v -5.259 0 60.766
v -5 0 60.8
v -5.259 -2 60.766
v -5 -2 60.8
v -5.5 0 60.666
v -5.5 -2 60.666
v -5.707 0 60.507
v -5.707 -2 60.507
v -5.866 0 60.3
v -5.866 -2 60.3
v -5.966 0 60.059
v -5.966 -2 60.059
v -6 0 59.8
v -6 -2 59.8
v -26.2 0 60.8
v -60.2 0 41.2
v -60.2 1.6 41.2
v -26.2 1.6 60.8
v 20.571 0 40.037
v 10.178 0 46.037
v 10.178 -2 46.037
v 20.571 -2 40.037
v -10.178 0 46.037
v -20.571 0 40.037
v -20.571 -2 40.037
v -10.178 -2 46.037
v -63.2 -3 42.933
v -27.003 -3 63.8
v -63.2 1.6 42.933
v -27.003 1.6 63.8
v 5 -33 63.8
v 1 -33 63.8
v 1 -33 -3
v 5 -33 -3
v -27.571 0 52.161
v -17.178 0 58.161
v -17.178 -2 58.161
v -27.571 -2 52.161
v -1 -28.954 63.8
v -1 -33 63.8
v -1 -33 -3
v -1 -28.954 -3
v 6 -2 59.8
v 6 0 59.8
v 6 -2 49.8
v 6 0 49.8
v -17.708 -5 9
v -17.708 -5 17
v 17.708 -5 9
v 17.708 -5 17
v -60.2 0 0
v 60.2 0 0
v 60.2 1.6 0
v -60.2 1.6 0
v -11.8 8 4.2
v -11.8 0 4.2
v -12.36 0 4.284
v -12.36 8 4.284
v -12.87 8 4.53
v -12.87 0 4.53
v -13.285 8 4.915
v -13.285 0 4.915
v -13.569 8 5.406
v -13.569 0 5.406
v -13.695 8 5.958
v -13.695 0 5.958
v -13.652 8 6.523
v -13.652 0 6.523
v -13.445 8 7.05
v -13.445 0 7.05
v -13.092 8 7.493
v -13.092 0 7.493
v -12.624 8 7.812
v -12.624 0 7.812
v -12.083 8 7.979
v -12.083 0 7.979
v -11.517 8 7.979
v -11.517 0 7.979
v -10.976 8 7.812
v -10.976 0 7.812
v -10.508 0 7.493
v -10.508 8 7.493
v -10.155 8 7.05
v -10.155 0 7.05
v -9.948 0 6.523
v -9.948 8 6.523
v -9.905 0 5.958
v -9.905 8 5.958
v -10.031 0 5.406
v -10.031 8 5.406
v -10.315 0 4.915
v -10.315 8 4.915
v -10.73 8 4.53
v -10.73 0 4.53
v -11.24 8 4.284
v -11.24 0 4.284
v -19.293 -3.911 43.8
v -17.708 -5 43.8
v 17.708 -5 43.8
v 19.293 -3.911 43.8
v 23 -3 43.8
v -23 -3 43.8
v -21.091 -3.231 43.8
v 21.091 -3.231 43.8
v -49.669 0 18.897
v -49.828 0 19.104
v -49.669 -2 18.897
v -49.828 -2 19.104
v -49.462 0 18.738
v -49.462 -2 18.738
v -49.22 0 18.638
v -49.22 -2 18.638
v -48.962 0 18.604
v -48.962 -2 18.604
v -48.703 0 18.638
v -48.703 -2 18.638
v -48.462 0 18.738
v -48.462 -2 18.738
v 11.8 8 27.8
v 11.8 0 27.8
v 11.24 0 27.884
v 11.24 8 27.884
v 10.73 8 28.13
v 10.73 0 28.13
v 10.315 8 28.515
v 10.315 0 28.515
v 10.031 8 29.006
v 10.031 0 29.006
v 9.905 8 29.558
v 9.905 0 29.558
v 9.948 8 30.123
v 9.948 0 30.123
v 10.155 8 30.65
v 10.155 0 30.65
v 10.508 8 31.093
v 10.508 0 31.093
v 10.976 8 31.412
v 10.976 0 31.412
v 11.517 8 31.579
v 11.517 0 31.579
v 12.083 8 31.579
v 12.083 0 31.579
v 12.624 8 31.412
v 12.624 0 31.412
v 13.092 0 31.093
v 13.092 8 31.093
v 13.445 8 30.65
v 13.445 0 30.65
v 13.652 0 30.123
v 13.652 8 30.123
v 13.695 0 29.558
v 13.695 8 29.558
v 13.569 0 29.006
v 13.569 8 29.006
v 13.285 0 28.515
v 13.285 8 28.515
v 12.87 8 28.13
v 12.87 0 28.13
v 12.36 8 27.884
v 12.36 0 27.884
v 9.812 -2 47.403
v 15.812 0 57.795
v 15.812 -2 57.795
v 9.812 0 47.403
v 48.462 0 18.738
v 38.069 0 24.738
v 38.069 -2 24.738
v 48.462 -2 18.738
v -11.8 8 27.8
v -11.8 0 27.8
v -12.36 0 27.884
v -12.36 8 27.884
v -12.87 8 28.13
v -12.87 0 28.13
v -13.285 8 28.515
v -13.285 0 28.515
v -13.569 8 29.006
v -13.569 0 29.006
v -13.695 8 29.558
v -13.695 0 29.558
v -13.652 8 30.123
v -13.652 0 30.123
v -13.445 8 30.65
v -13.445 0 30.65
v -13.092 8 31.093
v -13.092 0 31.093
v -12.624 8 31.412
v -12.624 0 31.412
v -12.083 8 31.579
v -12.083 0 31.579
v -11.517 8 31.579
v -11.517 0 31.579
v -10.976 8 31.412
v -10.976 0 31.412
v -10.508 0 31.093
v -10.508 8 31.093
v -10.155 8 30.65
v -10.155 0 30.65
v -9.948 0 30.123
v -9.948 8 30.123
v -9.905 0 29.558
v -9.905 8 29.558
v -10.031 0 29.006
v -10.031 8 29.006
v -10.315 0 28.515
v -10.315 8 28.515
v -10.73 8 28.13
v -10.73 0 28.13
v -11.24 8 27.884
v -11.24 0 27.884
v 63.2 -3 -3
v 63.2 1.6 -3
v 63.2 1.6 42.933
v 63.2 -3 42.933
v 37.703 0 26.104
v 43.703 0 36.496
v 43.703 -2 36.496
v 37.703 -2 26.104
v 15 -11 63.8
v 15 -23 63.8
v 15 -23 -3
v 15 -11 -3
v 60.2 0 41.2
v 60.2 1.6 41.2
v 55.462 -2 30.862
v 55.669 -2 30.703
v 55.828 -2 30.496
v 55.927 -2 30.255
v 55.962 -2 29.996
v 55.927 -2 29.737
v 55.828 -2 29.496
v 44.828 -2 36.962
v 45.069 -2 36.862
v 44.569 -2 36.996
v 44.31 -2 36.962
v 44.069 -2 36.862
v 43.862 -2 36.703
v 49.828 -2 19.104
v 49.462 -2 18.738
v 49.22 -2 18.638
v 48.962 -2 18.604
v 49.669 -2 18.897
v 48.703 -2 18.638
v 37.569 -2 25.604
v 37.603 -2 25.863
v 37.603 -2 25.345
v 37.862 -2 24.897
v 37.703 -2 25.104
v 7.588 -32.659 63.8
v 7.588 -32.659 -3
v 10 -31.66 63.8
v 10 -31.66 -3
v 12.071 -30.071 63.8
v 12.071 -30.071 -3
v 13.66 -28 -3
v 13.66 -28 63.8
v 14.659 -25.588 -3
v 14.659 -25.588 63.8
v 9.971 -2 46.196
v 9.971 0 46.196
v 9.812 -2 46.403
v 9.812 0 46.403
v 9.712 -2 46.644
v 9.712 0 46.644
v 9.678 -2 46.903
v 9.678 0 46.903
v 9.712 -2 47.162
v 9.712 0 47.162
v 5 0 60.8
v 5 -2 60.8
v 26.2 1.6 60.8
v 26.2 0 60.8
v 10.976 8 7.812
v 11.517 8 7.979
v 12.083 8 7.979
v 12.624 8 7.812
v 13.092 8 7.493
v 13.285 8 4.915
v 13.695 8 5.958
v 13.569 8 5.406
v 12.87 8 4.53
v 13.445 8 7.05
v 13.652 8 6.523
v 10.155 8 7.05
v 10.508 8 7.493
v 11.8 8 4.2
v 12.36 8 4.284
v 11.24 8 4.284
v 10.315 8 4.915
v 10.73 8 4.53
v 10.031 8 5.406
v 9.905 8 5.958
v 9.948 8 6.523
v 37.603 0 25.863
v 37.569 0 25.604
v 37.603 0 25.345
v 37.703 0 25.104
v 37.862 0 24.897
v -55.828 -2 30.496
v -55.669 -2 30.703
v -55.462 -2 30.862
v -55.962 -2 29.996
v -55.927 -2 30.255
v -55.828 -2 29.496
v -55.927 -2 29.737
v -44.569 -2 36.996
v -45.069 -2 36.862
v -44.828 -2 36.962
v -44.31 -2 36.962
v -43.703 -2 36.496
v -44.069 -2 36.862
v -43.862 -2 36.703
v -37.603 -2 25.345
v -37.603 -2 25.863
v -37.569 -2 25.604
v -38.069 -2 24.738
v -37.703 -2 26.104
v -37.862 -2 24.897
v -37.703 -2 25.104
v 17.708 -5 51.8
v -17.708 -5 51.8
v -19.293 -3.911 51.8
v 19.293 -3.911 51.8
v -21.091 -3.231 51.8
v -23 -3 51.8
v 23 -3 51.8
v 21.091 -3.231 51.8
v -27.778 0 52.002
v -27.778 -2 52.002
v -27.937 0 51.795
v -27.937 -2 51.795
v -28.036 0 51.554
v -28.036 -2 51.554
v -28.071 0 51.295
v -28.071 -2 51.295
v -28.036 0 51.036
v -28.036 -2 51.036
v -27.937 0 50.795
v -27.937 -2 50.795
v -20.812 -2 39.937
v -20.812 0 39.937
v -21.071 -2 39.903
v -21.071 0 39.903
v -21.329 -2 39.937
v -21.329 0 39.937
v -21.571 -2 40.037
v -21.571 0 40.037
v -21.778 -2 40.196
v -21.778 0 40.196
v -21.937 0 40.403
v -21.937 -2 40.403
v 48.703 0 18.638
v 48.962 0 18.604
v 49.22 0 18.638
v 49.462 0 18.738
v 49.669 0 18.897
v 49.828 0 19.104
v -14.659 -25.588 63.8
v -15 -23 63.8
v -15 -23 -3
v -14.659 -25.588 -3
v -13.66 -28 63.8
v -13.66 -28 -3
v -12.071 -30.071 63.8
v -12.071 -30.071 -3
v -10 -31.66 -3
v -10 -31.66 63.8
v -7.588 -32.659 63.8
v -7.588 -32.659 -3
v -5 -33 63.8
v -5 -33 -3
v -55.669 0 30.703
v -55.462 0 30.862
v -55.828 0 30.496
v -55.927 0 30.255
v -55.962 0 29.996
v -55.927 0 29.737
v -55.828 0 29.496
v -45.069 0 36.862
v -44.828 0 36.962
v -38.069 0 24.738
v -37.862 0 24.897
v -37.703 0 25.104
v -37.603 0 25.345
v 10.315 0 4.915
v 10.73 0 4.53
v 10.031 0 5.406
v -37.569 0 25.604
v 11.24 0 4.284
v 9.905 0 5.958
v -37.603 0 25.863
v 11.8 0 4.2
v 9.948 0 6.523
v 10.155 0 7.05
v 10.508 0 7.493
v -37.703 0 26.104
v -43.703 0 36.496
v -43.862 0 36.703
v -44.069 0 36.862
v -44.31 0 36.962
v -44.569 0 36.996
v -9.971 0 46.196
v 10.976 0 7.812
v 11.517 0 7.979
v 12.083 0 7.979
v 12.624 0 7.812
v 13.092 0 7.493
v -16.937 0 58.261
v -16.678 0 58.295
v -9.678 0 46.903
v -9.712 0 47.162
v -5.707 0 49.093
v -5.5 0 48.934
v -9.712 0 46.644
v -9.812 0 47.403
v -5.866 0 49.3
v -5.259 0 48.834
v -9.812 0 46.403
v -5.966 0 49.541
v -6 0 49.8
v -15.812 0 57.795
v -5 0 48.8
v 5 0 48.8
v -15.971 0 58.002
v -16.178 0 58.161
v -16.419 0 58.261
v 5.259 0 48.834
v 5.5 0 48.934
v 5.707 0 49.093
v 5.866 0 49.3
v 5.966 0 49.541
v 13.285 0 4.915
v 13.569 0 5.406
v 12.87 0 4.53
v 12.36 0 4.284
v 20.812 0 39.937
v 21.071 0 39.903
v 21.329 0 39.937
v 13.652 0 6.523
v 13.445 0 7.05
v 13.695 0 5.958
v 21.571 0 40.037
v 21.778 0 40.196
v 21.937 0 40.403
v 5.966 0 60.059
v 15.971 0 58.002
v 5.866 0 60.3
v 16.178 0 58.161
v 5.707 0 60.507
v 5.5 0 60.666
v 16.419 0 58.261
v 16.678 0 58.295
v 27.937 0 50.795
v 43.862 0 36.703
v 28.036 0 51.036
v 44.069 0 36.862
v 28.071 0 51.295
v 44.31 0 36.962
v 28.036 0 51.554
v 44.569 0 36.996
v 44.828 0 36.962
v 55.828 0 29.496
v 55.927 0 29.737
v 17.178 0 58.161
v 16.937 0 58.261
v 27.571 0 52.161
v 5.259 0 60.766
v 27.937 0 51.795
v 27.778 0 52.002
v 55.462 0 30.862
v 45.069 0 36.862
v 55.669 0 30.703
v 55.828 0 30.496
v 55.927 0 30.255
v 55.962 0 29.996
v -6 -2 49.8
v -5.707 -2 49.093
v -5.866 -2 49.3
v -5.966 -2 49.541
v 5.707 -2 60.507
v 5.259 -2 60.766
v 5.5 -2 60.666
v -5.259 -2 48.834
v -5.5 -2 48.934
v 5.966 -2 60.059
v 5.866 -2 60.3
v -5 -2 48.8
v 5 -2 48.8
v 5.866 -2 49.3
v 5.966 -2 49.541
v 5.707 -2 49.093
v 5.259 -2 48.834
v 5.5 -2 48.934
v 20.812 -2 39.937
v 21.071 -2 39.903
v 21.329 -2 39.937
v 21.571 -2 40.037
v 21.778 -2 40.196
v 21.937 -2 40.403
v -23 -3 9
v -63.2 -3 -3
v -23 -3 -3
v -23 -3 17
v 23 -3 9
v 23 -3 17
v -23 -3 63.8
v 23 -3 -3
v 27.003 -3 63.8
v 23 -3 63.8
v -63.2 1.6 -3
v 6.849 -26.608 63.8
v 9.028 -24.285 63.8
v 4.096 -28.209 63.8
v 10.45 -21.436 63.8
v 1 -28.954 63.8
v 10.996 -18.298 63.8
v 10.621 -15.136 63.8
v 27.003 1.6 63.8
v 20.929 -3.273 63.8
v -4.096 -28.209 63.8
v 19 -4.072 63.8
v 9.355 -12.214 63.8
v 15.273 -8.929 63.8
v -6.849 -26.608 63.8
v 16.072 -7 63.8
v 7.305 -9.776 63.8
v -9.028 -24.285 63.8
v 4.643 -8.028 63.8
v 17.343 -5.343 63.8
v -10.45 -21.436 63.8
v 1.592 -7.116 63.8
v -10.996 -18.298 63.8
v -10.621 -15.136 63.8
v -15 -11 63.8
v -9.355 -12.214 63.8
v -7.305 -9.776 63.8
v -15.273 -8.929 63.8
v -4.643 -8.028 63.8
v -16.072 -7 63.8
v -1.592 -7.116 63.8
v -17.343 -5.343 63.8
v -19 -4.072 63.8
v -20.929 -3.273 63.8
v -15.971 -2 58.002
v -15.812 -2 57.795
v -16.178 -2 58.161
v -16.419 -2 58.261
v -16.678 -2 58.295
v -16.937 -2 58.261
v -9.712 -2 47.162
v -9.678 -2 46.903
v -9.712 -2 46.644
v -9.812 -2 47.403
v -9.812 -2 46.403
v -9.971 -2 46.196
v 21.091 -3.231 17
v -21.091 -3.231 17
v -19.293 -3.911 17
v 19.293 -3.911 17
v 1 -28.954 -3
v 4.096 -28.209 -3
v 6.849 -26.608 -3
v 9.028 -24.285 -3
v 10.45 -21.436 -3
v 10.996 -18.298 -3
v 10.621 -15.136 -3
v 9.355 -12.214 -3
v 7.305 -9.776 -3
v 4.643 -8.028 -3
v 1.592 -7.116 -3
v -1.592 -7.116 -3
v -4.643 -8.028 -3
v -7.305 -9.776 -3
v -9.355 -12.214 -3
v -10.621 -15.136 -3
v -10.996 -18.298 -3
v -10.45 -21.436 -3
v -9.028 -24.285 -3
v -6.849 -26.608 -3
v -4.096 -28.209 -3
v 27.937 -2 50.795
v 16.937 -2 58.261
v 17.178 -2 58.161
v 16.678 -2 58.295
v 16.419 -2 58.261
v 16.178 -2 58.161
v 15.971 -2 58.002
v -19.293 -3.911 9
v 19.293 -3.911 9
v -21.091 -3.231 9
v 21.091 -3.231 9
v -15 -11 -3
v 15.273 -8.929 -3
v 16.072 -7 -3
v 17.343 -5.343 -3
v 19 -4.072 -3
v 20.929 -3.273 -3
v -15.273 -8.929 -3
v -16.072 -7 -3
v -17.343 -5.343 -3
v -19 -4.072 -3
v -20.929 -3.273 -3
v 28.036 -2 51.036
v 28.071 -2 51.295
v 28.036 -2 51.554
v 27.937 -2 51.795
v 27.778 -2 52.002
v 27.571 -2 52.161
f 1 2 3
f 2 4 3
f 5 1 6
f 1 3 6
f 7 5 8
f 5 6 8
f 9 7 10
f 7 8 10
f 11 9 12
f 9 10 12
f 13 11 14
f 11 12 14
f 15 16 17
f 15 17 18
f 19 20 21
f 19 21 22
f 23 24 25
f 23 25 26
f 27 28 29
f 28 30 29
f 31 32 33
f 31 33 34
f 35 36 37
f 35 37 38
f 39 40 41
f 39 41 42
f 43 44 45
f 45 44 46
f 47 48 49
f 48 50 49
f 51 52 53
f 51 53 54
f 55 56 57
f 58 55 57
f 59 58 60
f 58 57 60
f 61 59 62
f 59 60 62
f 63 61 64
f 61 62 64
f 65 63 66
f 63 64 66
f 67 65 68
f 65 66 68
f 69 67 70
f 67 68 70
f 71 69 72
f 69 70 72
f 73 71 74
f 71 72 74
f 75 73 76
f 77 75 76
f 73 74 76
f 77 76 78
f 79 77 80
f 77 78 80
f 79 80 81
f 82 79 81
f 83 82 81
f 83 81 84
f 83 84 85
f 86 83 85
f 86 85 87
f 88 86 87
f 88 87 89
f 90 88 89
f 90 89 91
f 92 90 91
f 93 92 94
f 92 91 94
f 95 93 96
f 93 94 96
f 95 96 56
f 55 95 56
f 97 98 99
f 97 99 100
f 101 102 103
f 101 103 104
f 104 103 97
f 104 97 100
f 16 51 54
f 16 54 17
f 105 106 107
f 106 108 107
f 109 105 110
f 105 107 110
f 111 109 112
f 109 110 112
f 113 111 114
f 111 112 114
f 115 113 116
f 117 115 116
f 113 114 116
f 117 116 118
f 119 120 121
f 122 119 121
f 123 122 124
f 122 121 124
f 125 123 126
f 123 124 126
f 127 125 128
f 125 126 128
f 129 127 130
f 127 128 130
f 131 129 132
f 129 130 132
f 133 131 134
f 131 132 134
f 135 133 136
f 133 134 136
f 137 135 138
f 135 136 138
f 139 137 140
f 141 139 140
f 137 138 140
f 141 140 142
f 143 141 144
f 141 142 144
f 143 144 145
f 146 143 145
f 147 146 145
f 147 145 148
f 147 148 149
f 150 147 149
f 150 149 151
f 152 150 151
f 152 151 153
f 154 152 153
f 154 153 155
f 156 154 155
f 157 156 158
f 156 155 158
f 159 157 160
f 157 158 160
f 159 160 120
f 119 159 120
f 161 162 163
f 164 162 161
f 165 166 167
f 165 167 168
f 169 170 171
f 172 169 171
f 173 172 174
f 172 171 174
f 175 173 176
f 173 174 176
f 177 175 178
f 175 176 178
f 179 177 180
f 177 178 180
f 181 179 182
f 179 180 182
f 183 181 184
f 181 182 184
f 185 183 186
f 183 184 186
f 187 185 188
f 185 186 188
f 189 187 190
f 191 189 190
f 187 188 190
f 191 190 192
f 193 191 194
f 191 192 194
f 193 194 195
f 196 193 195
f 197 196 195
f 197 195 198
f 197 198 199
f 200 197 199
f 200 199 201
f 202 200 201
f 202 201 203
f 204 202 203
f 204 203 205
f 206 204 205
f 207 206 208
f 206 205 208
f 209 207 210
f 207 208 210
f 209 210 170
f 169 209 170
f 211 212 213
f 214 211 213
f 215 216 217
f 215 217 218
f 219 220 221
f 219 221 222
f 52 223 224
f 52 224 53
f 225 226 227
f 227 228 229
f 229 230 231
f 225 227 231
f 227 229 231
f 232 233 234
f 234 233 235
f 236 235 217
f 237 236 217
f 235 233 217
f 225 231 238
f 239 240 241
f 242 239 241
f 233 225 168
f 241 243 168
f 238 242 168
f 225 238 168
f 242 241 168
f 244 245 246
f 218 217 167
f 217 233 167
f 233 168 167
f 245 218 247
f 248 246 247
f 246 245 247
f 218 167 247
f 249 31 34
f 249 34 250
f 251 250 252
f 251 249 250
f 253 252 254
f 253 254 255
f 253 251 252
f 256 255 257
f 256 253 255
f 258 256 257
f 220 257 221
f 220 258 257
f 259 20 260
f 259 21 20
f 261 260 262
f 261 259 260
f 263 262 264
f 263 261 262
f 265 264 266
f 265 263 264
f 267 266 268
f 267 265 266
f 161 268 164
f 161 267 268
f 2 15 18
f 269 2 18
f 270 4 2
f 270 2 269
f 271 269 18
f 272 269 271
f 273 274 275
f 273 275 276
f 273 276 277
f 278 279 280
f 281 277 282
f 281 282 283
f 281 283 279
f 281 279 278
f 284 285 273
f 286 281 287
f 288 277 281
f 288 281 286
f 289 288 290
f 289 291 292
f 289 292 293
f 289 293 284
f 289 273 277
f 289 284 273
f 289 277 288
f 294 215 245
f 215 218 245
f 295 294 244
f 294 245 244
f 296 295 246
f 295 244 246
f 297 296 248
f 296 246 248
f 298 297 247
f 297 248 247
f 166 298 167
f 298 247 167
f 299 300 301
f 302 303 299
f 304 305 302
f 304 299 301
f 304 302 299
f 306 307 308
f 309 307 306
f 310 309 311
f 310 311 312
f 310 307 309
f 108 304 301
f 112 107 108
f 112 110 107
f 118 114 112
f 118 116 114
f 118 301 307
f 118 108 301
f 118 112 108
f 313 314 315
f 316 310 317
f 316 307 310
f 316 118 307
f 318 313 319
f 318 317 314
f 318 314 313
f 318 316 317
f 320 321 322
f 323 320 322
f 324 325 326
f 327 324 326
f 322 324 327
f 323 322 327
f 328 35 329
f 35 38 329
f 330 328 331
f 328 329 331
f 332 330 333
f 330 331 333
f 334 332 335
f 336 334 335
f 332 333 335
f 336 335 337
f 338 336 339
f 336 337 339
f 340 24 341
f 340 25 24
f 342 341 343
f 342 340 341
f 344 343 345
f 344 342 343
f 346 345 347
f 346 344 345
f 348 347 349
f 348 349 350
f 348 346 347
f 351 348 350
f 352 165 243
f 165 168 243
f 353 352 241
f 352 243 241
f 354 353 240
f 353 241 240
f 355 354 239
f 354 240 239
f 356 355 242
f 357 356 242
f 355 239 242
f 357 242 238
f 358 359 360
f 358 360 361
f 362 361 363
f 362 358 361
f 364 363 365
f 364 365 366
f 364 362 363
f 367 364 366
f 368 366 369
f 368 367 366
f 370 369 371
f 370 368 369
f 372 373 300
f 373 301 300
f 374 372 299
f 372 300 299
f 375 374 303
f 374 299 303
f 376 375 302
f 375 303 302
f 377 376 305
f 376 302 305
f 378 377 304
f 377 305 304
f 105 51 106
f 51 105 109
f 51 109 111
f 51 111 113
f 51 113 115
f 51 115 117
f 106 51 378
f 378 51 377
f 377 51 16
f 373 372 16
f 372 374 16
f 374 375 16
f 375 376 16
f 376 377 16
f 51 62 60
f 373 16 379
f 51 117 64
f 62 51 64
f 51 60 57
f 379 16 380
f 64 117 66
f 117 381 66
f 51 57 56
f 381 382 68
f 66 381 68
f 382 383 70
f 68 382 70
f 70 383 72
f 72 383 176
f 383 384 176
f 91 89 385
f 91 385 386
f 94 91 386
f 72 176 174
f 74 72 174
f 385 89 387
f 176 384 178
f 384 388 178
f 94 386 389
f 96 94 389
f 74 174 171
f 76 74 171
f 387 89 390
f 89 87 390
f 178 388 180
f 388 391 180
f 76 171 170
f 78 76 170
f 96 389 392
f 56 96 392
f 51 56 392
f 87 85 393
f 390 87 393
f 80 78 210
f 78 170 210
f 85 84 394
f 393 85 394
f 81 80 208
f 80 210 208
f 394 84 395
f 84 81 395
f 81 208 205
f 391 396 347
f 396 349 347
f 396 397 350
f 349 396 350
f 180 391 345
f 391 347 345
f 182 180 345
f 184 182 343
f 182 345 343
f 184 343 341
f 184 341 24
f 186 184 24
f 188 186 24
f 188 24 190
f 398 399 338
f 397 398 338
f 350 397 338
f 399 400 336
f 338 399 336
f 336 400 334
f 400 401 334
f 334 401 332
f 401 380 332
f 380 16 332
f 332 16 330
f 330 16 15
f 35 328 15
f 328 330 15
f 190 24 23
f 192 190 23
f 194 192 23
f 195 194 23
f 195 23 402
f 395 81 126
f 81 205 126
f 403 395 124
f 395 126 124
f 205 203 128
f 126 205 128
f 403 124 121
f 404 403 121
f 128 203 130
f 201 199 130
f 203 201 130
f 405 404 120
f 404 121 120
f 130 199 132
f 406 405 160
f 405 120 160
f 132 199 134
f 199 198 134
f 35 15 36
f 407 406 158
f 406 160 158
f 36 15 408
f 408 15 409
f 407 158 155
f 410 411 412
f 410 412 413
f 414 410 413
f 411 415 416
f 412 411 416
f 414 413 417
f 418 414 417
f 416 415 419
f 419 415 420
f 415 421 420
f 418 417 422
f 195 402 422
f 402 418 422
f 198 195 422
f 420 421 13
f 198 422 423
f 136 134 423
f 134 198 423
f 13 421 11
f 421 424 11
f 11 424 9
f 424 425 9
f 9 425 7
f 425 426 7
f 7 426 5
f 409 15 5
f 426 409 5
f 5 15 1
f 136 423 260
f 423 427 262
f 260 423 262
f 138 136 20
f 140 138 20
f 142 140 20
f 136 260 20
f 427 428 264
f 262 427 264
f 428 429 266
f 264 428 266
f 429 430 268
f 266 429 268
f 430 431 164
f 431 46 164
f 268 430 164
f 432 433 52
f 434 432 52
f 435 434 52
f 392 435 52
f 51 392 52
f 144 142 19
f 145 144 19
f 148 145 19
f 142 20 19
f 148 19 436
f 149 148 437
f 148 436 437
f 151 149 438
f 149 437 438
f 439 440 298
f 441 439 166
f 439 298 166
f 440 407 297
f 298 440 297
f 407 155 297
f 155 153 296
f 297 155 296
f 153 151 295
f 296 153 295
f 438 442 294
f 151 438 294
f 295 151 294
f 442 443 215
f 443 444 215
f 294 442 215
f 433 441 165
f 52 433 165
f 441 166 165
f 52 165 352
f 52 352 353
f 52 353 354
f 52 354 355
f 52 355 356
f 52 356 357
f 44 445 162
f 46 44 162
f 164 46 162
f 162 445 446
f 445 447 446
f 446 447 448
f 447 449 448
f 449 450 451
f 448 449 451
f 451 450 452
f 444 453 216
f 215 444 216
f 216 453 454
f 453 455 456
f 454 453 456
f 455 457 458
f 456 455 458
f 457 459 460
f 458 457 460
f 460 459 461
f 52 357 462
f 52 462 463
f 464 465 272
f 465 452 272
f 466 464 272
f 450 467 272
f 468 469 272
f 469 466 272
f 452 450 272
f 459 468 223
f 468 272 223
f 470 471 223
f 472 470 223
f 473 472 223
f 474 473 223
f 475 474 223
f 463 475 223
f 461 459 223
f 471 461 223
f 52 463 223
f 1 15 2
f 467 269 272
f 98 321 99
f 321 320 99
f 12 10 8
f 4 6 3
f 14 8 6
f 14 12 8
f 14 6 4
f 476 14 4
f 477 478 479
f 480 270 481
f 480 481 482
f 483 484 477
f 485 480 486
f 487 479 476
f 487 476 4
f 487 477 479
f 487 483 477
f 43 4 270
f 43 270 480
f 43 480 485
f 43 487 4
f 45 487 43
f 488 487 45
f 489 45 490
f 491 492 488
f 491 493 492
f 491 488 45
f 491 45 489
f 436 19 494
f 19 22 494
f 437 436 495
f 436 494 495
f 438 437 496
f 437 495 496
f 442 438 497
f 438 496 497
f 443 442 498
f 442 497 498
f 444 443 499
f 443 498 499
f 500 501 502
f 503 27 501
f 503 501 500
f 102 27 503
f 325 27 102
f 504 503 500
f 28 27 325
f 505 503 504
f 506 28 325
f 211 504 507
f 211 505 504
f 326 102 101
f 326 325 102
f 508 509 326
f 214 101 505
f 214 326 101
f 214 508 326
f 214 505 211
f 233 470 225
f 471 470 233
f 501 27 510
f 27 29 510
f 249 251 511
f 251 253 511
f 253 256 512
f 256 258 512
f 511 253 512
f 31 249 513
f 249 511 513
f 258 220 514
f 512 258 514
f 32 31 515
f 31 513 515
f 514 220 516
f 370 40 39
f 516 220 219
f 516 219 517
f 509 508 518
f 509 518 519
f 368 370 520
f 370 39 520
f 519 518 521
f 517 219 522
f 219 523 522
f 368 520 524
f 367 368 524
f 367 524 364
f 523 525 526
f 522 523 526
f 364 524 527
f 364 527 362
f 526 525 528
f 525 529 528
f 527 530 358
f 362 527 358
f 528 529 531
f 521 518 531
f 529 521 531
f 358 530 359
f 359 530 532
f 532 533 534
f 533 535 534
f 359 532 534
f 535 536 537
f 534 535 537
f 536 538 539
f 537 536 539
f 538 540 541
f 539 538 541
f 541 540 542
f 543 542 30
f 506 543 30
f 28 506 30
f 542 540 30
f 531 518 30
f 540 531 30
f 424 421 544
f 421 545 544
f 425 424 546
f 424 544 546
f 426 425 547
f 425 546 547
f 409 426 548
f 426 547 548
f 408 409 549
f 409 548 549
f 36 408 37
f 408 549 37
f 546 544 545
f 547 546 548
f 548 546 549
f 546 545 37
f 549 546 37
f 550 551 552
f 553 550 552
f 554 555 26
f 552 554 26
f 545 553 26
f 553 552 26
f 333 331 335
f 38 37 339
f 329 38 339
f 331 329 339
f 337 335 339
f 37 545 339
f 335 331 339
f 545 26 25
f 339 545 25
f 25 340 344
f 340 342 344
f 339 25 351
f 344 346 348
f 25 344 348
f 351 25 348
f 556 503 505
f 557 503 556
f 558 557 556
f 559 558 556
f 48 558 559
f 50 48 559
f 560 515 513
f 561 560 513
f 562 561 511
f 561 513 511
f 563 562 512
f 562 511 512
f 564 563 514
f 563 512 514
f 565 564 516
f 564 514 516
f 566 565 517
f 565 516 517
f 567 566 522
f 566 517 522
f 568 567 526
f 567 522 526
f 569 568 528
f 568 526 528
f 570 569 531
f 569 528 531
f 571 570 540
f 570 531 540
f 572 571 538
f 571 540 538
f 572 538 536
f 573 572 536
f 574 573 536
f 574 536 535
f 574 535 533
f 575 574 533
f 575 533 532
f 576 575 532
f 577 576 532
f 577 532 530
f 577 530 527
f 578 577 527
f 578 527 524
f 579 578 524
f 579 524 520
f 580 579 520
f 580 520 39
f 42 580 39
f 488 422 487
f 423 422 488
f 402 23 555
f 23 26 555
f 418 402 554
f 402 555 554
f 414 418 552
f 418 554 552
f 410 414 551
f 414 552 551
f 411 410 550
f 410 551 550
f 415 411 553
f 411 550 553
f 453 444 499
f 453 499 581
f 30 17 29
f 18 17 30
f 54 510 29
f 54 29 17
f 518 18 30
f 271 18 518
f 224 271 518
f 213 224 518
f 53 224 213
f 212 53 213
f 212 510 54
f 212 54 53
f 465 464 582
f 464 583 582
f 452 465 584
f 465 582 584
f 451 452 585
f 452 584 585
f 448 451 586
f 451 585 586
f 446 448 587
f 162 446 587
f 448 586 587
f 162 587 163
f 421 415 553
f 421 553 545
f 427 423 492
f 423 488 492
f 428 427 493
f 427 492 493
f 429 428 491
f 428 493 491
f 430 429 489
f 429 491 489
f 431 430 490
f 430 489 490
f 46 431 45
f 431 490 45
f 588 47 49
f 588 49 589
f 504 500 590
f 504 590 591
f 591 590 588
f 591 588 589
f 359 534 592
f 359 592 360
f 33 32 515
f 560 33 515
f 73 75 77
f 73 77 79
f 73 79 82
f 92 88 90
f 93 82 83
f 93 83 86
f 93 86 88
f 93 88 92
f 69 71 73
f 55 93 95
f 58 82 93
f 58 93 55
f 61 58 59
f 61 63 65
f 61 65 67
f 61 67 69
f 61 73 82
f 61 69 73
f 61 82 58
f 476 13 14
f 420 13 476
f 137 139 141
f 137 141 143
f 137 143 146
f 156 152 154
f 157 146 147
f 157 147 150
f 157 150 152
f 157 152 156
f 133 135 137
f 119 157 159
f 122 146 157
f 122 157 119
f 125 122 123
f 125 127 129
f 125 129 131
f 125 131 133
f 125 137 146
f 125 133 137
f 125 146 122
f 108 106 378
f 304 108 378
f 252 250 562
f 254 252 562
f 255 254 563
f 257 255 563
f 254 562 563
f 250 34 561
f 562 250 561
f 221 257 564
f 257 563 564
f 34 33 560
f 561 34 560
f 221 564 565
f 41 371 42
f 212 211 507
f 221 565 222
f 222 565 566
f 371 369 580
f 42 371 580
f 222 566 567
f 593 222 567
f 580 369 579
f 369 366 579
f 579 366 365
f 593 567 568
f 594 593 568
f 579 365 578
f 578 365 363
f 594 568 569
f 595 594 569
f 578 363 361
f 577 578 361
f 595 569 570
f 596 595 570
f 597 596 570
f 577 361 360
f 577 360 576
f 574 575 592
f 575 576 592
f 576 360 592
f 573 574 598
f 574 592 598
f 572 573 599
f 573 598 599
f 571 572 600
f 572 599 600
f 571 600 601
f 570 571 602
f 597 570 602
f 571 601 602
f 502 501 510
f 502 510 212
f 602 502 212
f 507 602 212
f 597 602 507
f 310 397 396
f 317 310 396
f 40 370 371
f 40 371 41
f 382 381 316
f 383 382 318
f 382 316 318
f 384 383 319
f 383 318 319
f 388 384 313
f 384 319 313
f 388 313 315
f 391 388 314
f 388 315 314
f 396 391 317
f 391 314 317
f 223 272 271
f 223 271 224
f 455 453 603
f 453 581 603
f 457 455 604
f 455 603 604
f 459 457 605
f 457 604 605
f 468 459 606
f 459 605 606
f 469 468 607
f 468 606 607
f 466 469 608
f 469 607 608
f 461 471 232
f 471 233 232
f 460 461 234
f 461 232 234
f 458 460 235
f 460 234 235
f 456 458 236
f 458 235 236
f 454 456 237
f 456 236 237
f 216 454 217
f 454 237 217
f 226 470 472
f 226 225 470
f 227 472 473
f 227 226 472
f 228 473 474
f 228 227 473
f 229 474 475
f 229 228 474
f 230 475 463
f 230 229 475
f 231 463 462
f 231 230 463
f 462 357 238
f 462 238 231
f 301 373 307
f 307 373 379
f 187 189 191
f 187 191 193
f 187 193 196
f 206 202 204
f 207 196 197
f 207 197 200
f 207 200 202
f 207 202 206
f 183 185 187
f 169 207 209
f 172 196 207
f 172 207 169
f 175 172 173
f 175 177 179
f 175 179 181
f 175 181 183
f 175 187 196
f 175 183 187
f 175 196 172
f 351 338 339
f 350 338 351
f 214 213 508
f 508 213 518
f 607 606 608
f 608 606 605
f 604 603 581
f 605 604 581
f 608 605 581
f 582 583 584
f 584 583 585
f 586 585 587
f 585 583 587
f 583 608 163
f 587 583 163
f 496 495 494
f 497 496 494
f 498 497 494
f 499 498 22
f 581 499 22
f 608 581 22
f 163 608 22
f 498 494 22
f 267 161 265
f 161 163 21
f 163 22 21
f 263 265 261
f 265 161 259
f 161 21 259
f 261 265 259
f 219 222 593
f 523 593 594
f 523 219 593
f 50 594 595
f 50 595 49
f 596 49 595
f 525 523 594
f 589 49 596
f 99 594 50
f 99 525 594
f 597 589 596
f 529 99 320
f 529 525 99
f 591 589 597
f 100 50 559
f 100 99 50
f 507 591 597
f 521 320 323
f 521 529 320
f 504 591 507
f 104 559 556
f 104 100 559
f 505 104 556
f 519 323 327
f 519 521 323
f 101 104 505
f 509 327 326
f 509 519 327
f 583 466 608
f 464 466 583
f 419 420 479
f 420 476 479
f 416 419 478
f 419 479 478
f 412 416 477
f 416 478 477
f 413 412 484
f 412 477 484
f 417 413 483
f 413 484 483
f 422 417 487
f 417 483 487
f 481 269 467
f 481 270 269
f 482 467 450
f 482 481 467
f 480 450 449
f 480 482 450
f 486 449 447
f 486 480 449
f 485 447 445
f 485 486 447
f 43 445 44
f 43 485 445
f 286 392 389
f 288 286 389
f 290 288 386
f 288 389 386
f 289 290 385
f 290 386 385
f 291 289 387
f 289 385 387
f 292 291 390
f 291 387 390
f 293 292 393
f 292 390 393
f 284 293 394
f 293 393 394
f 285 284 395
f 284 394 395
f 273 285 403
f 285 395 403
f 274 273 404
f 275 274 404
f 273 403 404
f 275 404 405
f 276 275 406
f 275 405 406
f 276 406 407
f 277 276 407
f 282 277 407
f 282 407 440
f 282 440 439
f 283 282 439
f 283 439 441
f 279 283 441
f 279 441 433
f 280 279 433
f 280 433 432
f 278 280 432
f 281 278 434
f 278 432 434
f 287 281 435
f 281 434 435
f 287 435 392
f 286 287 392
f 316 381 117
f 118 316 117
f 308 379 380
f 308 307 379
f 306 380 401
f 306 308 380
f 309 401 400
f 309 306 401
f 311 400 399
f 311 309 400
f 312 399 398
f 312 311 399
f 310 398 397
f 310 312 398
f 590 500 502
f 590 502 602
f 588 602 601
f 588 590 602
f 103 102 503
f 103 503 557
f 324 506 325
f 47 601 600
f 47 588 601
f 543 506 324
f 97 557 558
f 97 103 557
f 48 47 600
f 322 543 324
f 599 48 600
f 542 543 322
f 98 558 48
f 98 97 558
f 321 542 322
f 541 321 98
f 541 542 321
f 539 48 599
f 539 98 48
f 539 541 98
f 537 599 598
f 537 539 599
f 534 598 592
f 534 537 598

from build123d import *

# Parameters (mm, degrees)
EXTRUDE_1_DEPTH          = 1.6
EXTRUDE_2_DEPTH          = 3
SKETCH_3_W               = 12
SKETCH_3_H               = 12
CUT_EXTRUDE_1_DEPTH      = 2
FILLET_1_R               = 1
SKETCH_4_R               = 1.9
EXTRUDE_3_DEPTH          = 8
SKETCH_12_R              = 11
EXTRUDE_9_DEPTH          = 66.8
CUT_EXTRUDE_2_DEPTH      = 98.70097236
CUT_EXTRUDE_2_DEPTH_BACK = 98.70097236
SKETCH_13_W              = 2
SKETCH_13_H              = 4.04554885
CUT_EXTRUDE_5_DEPTH      = 107.182296076
CUT_EXTRUDE_5_DEPTH_BACK = 107.182296076
SKETCH_16_W              = 8
SKETCH_16_H              = 2
FILLET_2_R               = 8


with BuildPart() as part:
    # Эскиз1 → Бобышка-Вытянуть1 (new body)
    with BuildSketch(Plane(origin=(0, 0, 0), x_dir=(1, 0, 0), z_dir=(0, 1, 0))):
        Polygon((27.002786573, -63.8), (63.2, -42.933371083), (63.2, 3), (-63.2, 3), (-63.2, -42.933371083), (-27.002786573, -63.8), align=None)
        Polygon((60.2, -41.2), (60.2, 0), (-60.2, 0), (-60.2, -41.2), (-26.2, -60.8), (26.2, -60.8), align=None, mode=Mode.SUBTRACT)
    extrude(amount=EXTRUDE_1_DEPTH)

    # Эскиз2 → Бобышка-Вытянуть2 (add)
    with BuildSketch(Plane.XZ):
        Polygon((63.2, 42.933371083), (27.002786573, 63.8), (-27.002786573, 63.8), (-63.2, 42.933371083), (-63.2, -3), (63.2, -3), align=None)
    extrude(amount=EXTRUDE_2_DEPTH)

    # Эскиз3 → Вырез-Вытянуть1 (cut)
    with BuildSketch(Plane(origin=(0, 0, 0), x_dir=(1, 0, 0), z_dir=(0, 1, 0))):
        with Locations((0, -54.8)):
            Rectangle(SKETCH_3_W, SKETCH_3_H)
        Polygon((-21.436533479, -39.536860279), (-9.312177826, -46.536860279), (-16.312177826, -58.661215932), (-28.436533479, -51.661215932), align=None)
        Polygon((9.312177826, -46.536860279), (21.436533479, -39.536860279), (28.436533479, -51.661215932), (16.312177826, -58.661215932), align=None)
        Polygon((56.327549631, -30.362177826), (44.203193978, -37.362177826), (37.203193978, -25.237822174), (49.327549631, -18.237822174), align=None)
        Polygon((-44.203193978, -37.362177826), (-37.203193978, -25.237822174), (-49.327549631, -18.237822174), (-56.327549631, -30.362177826), align=None)
    extrude(amount=-CUT_EXTRUDE_1_DEPTH, mode=Mode.SUBTRACT)

    # Скругление1
    fillet_1_edges = [part.edges().sort_by_distance(p)[0] for p in [
        (-44.203193978, -1, 37.362177826),
        (-56.327549631, -1, 30.362177826),
        (-49.327549631, -1, 18.237822174),
        (-37.203193978, -1, 25.237822174),
        (49.327549631, -1, 18.237822174),
        (56.327549631, -1, 30.362177826),
        (44.203193978, -1, 37.362177826),
        (37.203193978, -1, 25.237822174),
        (-28.436533479, -1, 51.661215932),
        (-21.436533479, -1, 39.536860279),
        (-9.312177826, -1, 46.536860279),
        (-16.312177826, -1, 58.661215932),
        (16.312177826, -1, 58.661215932),
        (9.312177826, -1, 46.536860279),
        (21.436533479, -1, 39.536860279),
        (28.436533479, -1, 51.661215932),
        (-6, -1, 60.8),
        (-6, -1, 48.8),
        (6, -1, 48.8),
        (6, -1, 60.8),
    ]]
    fillet(fillet_1_edges, radius=FILLET_1_R)

    # Эскиз4 → Бобышка-Вытянуть3 (add)
    with BuildSketch(Plane(origin=(0, 0, 0), x_dir=(1, 0, 0), z_dir=(0, 1, 0))):
        with Locations(Location((-11.8, -6.1, 0), (0, 0, 90))):
            Circle(SKETCH_4_R)
        with Locations(Location((-11.8, -29.7, 0), (0, 0, 90))):
            Circle(SKETCH_4_R)
        with Locations(Location((11.8, -29.7, 0), (0, 0, 90))):
            Circle(SKETCH_4_R)
        with Locations(Location((11.8, -6.1, 0), (0, 0, 90))):
            Circle(SKETCH_4_R)
    extrude(amount=EXTRUDE_3_DEPTH)

    # Эскиз12 → Бобышка-Вытянуть9 (add)
    with BuildSketch(Plane.XY.offset(63.8)):
        with BuildLine():
            Line((-5, -33), (5, -33))
            ThreePointArc((5, -33), (12.071067812, -30.071067812), (15, -23))
            Line((15, -23), (15, -3))
            Line((15, -3), (-15, -3))
            Line((-15, -3), (-15, -23))
            ThreePointArc((-15, -23), (-12.071067812, -30.071067812), (-5, -33))
        make_face()
        with Locations((0, -18)):
            Circle(SKETCH_12_R, mode=Mode.SUBTRACT)
    extrude(amount=-EXTRUDE_9_DEPTH)

    # Эскиз13 → Вырез-Вытянуть2 (cut, two sides: drawn at the far end of the back side and taken through both)
    with BuildSketch(Plane(origin=(0, 0, -3), x_dir=(-1, 0, 0), z_dir=(0, 0, -1)).offset(-CUT_EXTRUDE_2_DEPTH_BACK)):
        with Locations((0, -30.977225575)):
            Rectangle(SKETCH_13_W, SKETCH_13_H)
    extrude(amount=CUT_EXTRUDE_2_DEPTH + CUT_EXTRUDE_2_DEPTH_BACK, mode=Mode.SUBTRACT)

    # Эскиз16 → Вырез-Вытянуть5 (cut, two sides: drawn at the far end of the back side and taken through both)
    with BuildSketch(Plane.ZY.offset(15).offset(-CUT_EXTRUDE_5_DEPTH_BACK)):
        with Locations((13, -4)):
            Rectangle(SKETCH_16_W, SKETCH_16_H)
        with Locations((47.8, -4)):
            Rectangle(SKETCH_16_W, SKETCH_16_H)
    extrude(amount=CUT_EXTRUDE_5_DEPTH + CUT_EXTRUDE_5_DEPTH_BACK, mode=Mode.SUBTRACT)

    # Скругление2
    # the kernel refuses this fillet: 8 mm, written as the material it adds along each edge
    with BuildSketch(Plane(origin=(15, -3, 29), x_dir=(0, -1, 0), z_dir=(0, 0, -1))) as fillet_2_piece_1_section:
        with BuildLine():
            CenterArc((FILLET_2_R, -FILLET_2_R), FILLET_2_R, 90, 90)
            Line((0, -FILLET_2_R), (0, 0))
            Line((0, 0), (FILLET_2_R, 0))
        make_face()
    fillet_2_piece_1 = extrude(amount=32, mode=Mode.PRIVATE)
    fillet_2_piece_1 = split(fillet_2_piece_1, bisect_by=Plane(origin=(15.781963001, -5, 23), z_dir=(0, -1, 0)), keep=Keep.TOP, mode=Mode.PRIVATE)
    add(fillet_2_piece_1)
    with BuildSketch(Plane(origin=(15, -3, 29), x_dir=(0, -1, 0), z_dir=(0, 0, -1))) as fillet_2_piece_2_section:
        with BuildLine():
            CenterArc((FILLET_2_R, -FILLET_2_R), FILLET_2_R, 90, 90)
            Line((0, -FILLET_2_R), (0, 0))
            Line((0, 0), (FILLET_2_R, 0))
        make_face()
    fillet_2_piece_2 = extrude(amount=52, mode=Mode.PRIVATE)
    fillet_2_piece_2 = split(fillet_2_piece_2, bisect_by=Plane(origin=(17.359978734, -3.841824997, 17), z_dir=(0, 0, 1)), keep=Keep.TOP, mode=Mode.PRIVATE)
    add(fillet_2_piece_2)
    with BuildSketch(Plane(origin=(15, -3, 9), x_dir=(0, -1, 0), z_dir=(0, 0, -1)), Plane(origin=(15, -3, 63.8), x_dir=(0, -1, 0), z_dir=(0, 0, -1))) as fillet_2_piece_3:
        with BuildLine():
            CenterArc((FILLET_2_R, -FILLET_2_R), FILLET_2_R, 90, 90)
            Line((0, -FILLET_2_R), (0, 0))
            Line((0, 0), (FILLET_2_R, 0))
        make_face()
    extrude(amount=12)
    with BuildSketch(Plane(origin=(-15, -3, 29), x_dir=(0, -1, 0), z_dir=(0, 0, -1))) as fillet_2_piece_4_section:
        with BuildLine():
            CenterArc((FILLET_2_R, FILLET_2_R), FILLET_2_R, 180, 90)
            Line((0, FILLET_2_R), (0, 0))
            Line((0, 0), (FILLET_2_R, 0))
        make_face()
    fillet_2_piece_4 = extrude(amount=32, mode=Mode.PRIVATE)
    fillet_2_piece_4 = split(fillet_2_piece_4, bisect_by=Plane(origin=(-15.781963001, -5, 23), z_dir=(0, -1, 0)), keep=Keep.TOP, mode=Mode.PRIVATE)
    add(fillet_2_piece_4)
    with BuildSketch(Plane(origin=(-15, -3, 29), x_dir=(0, -1, 0), z_dir=(0, 0, -1))) as fillet_2_piece_5_section:
        with BuildLine():
            CenterArc((FILLET_2_R, FILLET_2_R), FILLET_2_R, 180, 90)
            Line((0, FILLET_2_R), (0, 0))
            Line((0, 0), (FILLET_2_R, 0))
        make_face()
    fillet_2_piece_5 = extrude(amount=52, mode=Mode.PRIVATE)
    fillet_2_piece_5 = split(fillet_2_piece_5, bisect_by=Plane(origin=(-17.359978734, -3.841824997, 17), z_dir=(0, 0, 1)), keep=Keep.TOP, mode=Mode.PRIVATE)
    add(fillet_2_piece_5)
    with BuildSketch(Plane(origin=(-15, -3, 9), x_dir=(0, -1, 0), z_dir=(0, 0, -1)), Plane(origin=(-15, -3, 63.8), x_dir=(0, -1, 0), z_dir=(0, 0, -1))) as fillet_2_piece_6:
        with BuildLine():
            CenterArc((FILLET_2_R, FILLET_2_R), FILLET_2_R, 180, 90)
            Line((0, FILLET_2_R), (0, 0))
            Line((0, 0), (FILLET_2_R, 0))
        make_face()
    extrude(amount=12)
    with BuildSketch(Plane(origin=(15, -3, 63.8), x_dir=(0, -1, 0), z_dir=(0, 0, -1))) as fillet_2_piece_7_section:
        with BuildLine():
            CenterArc((FILLET_2_R, -FILLET_2_R), FILLET_2_R, 90, 90)
            Line((0, -FILLET_2_R), (0, 0))
            Line((0, 0), (FILLET_2_R, 0))
        make_face()
    fillet_2_piece_7 = extrude(amount=66.8, mode=Mode.PRIVATE)
    fillet_2_piece_7 = split(fillet_2_piece_7, bisect_by=Plane(origin=(15.781963001, -5, 57.8), z_dir=(0, -1, 0)), keep=Keep.TOP, mode=Mode.PRIVATE)
    add(fillet_2_piece_7)
    with BuildSketch(Plane(origin=(15, -3, 63.8), x_dir=(0, -1, 0), z_dir=(0, 0, -1))) as fillet_2_piece_8_section:
        with BuildLine():
            CenterArc((FILLET_2_R, -FILLET_2_R), FILLET_2_R, 90, 90)
            Line((0, -FILLET_2_R), (0, 0))
            Line((0, 0), (FILLET_2_R, 0))
        make_face()
    fillet_2_piece_8 = extrude(amount=66.8, mode=Mode.PRIVATE)
    fillet_2_piece_8 = split(fillet_2_piece_8, bisect_by=Plane(origin=(17.359978734, -3.841824997, 51.8), z_dir=(0, 0, 1)), keep=Keep.TOP, mode=Mode.PRIVATE)
    add(fillet_2_piece_8)
    with BuildSketch(Plane(origin=(15, -3, 43.8), x_dir=(0, -1, 0), z_dir=(0, 0, -1))) as fillet_2_piece_9:
        with BuildLine():
            CenterArc((FILLET_2_R, -FILLET_2_R), FILLET_2_R, 90, 90)
            Line((0, -FILLET_2_R), (0, 0))
            Line((0, 0), (FILLET_2_R, 0))
        make_face()
    extrude(amount=26.8)
    with BuildSketch(Plane(origin=(15, -3, 63.8), x_dir=(0, -1, 0), z_dir=(0, 0, -1))) as fillet_2_piece_10_section:
        with BuildLine():
            CenterArc((FILLET_2_R, -FILLET_2_R), FILLET_2_R, 90, 90)
            Line((0, -FILLET_2_R), (0, 0))
            Line((0, 0), (FILLET_2_R, 0))
        make_face()
    fillet_2_piece_10 = extrude(amount=66.8, mode=Mode.PRIVATE)
    fillet_2_piece_10 = split(fillet_2_piece_10, bisect_by=Plane(origin=(17.359978734, -3.841824997, 9), z_dir=(0, 0, -1)), keep=Keep.TOP, mode=Mode.PRIVATE)
    add(fillet_2_piece_10)
    with BuildSketch(Plane(origin=(15, -3, 63.8), x_dir=(0, -1, 0), z_dir=(0, 0, -1))) as fillet_2_piece_11_section:
        with BuildLine():
            CenterArc((FILLET_2_R, -FILLET_2_R), FILLET_2_R, 90, 90)
            Line((0, -FILLET_2_R), (0, 0))
            Line((0, 0), (FILLET_2_R, 0))
        make_face()
    fillet_2_piece_11 = extrude(amount=32, mode=Mode.PRIVATE)
    fillet_2_piece_11 = split(fillet_2_piece_11, bisect_by=Plane(origin=(15.781963001, -5, 57.8), z_dir=(0, -1, 0)), keep=Keep.TOP, mode=Mode.PRIVATE)
    add(fillet_2_piece_11)
    with BuildSketch(Plane(origin=(15, -3, 83.8), x_dir=(0, -1, 0), z_dir=(0, 0, -1))) as fillet_2_piece_12_section:
        with BuildLine():
            CenterArc((FILLET_2_R, -FILLET_2_R), FILLET_2_R, 90, 90)
            Line((0, -FILLET_2_R), (0, 0))
            Line((0, 0), (FILLET_2_R, 0))
        make_face()
    fillet_2_piece_12 = extrude(amount=52, mode=Mode.PRIVATE)
    fillet_2_piece_12 = split(fillet_2_piece_12, bisect_by=Plane(origin=(17.359978734, -3.841824997, 43.8), z_dir=(0, 0, -1)), keep=Keep.TOP, mode=Mode.PRIVATE)
    add(fillet_2_piece_12)
    with BuildSketch(Plane(origin=(-15, -3, 63.8), x_dir=(0, -1, 0), z_dir=(0, 0, -1))) as fillet_2_piece_13_section:
        with BuildLine():
            CenterArc((FILLET_2_R, FILLET_2_R), FILLET_2_R, 180, 90)
            Line((0, FILLET_2_R), (0, 0))
            Line((0, 0), (FILLET_2_R, 0))
        make_face()
    fillet_2_piece_13 = extrude(amount=66.8, mode=Mode.PRIVATE)
    fillet_2_piece_13 = split(fillet_2_piece_13, bisect_by=Plane(origin=(-15.781963001, -5, 57.8), z_dir=(0, -1, 0)), keep=Keep.TOP, mode=Mode.PRIVATE)
    add(fillet_2_piece_13)
    with BuildSketch(Plane(origin=(-15, -3, 63.8), x_dir=(0, -1, 0), z_dir=(0, 0, -1))) as fillet_2_piece_14_section:
        with BuildLine():
            CenterArc((FILLET_2_R, FILLET_2_R), FILLET_2_R, 180, 90)
            Line((0, FILLET_2_R), (0, 0))
            Line((0, 0), (FILLET_2_R, 0))
        make_face()
    fillet_2_piece_14 = extrude(amount=66.8, mode=Mode.PRIVATE)
    fillet_2_piece_14 = split(fillet_2_piece_14, bisect_by=Plane(origin=(-17.359978734, -3.841824997, 51.8), z_dir=(0, 0, 1)), keep=Keep.TOP, mode=Mode.PRIVATE)
    add(fillet_2_piece_14)
    with BuildSketch(Plane(origin=(-15, -3, 43.8), x_dir=(0, -1, 0), z_dir=(0, 0, -1))) as fillet_2_piece_15:
        with BuildLine():
            CenterArc((FILLET_2_R, FILLET_2_R), FILLET_2_R, 180, 90)
            Line((0, FILLET_2_R), (0, 0))
            Line((0, 0), (FILLET_2_R, 0))
        make_face()
    extrude(amount=26.8)
    with BuildSketch(Plane(origin=(-15, -3, 63.8), x_dir=(0, -1, 0), z_dir=(0, 0, -1))) as fillet_2_piece_16_section:
        with BuildLine():
            CenterArc((FILLET_2_R, FILLET_2_R), FILLET_2_R, 180, 90)
            Line((0, FILLET_2_R), (0, 0))
            Line((0, 0), (FILLET_2_R, 0))
        make_face()
    fillet_2_piece_16 = extrude(amount=66.8, mode=Mode.PRIVATE)
    fillet_2_piece_16 = split(fillet_2_piece_16, bisect_by=Plane(origin=(-17.359978734, -3.841824997, 9), z_dir=(0, 0, -1)), keep=Keep.TOP, mode=Mode.PRIVATE)
    add(fillet_2_piece_16)
    with BuildSketch(Plane(origin=(-15, -3, 63.8), x_dir=(0, -1, 0), z_dir=(0, 0, -1))) as fillet_2_piece_17_section:
        with BuildLine():
            CenterArc((FILLET_2_R, FILLET_2_R), FILLET_2_R, 180, 90)
            Line((0, FILLET_2_R), (0, 0))
            Line((0, 0), (FILLET_2_R, 0))
        make_face()
    fillet_2_piece_17 = extrude(amount=32, mode=Mode.PRIVATE)
    fillet_2_piece_17 = split(fillet_2_piece_17, bisect_by=Plane(origin=(-15.781963001, -5, 57.8), z_dir=(0, -1, 0)), keep=Keep.TOP, mode=Mode.PRIVATE)
    add(fillet_2_piece_17)
    with BuildSketch(Plane(origin=(-15, -3, 83.8), x_dir=(0, -1, 0), z_dir=(0, 0, -1))) as fillet_2_piece_18_section:
        with BuildLine():
            CenterArc((FILLET_2_R, FILLET_2_R), FILLET_2_R, 180, 90)
            Line((0, FILLET_2_R), (0, 0))
            Line((0, 0), (FILLET_2_R, 0))
        make_face()
    fillet_2_piece_18 = extrude(amount=52, mode=Mode.PRIVATE)
    fillet_2_piece_18 = split(fillet_2_piece_18, bisect_by=Plane(origin=(-17.359978734, -3.841824997, 43.8), z_dir=(0, 0, -1)), keep=Keep.TOP, mode=Mode.PRIVATE)
    add(fillet_2_piece_18)


solid = part.part
